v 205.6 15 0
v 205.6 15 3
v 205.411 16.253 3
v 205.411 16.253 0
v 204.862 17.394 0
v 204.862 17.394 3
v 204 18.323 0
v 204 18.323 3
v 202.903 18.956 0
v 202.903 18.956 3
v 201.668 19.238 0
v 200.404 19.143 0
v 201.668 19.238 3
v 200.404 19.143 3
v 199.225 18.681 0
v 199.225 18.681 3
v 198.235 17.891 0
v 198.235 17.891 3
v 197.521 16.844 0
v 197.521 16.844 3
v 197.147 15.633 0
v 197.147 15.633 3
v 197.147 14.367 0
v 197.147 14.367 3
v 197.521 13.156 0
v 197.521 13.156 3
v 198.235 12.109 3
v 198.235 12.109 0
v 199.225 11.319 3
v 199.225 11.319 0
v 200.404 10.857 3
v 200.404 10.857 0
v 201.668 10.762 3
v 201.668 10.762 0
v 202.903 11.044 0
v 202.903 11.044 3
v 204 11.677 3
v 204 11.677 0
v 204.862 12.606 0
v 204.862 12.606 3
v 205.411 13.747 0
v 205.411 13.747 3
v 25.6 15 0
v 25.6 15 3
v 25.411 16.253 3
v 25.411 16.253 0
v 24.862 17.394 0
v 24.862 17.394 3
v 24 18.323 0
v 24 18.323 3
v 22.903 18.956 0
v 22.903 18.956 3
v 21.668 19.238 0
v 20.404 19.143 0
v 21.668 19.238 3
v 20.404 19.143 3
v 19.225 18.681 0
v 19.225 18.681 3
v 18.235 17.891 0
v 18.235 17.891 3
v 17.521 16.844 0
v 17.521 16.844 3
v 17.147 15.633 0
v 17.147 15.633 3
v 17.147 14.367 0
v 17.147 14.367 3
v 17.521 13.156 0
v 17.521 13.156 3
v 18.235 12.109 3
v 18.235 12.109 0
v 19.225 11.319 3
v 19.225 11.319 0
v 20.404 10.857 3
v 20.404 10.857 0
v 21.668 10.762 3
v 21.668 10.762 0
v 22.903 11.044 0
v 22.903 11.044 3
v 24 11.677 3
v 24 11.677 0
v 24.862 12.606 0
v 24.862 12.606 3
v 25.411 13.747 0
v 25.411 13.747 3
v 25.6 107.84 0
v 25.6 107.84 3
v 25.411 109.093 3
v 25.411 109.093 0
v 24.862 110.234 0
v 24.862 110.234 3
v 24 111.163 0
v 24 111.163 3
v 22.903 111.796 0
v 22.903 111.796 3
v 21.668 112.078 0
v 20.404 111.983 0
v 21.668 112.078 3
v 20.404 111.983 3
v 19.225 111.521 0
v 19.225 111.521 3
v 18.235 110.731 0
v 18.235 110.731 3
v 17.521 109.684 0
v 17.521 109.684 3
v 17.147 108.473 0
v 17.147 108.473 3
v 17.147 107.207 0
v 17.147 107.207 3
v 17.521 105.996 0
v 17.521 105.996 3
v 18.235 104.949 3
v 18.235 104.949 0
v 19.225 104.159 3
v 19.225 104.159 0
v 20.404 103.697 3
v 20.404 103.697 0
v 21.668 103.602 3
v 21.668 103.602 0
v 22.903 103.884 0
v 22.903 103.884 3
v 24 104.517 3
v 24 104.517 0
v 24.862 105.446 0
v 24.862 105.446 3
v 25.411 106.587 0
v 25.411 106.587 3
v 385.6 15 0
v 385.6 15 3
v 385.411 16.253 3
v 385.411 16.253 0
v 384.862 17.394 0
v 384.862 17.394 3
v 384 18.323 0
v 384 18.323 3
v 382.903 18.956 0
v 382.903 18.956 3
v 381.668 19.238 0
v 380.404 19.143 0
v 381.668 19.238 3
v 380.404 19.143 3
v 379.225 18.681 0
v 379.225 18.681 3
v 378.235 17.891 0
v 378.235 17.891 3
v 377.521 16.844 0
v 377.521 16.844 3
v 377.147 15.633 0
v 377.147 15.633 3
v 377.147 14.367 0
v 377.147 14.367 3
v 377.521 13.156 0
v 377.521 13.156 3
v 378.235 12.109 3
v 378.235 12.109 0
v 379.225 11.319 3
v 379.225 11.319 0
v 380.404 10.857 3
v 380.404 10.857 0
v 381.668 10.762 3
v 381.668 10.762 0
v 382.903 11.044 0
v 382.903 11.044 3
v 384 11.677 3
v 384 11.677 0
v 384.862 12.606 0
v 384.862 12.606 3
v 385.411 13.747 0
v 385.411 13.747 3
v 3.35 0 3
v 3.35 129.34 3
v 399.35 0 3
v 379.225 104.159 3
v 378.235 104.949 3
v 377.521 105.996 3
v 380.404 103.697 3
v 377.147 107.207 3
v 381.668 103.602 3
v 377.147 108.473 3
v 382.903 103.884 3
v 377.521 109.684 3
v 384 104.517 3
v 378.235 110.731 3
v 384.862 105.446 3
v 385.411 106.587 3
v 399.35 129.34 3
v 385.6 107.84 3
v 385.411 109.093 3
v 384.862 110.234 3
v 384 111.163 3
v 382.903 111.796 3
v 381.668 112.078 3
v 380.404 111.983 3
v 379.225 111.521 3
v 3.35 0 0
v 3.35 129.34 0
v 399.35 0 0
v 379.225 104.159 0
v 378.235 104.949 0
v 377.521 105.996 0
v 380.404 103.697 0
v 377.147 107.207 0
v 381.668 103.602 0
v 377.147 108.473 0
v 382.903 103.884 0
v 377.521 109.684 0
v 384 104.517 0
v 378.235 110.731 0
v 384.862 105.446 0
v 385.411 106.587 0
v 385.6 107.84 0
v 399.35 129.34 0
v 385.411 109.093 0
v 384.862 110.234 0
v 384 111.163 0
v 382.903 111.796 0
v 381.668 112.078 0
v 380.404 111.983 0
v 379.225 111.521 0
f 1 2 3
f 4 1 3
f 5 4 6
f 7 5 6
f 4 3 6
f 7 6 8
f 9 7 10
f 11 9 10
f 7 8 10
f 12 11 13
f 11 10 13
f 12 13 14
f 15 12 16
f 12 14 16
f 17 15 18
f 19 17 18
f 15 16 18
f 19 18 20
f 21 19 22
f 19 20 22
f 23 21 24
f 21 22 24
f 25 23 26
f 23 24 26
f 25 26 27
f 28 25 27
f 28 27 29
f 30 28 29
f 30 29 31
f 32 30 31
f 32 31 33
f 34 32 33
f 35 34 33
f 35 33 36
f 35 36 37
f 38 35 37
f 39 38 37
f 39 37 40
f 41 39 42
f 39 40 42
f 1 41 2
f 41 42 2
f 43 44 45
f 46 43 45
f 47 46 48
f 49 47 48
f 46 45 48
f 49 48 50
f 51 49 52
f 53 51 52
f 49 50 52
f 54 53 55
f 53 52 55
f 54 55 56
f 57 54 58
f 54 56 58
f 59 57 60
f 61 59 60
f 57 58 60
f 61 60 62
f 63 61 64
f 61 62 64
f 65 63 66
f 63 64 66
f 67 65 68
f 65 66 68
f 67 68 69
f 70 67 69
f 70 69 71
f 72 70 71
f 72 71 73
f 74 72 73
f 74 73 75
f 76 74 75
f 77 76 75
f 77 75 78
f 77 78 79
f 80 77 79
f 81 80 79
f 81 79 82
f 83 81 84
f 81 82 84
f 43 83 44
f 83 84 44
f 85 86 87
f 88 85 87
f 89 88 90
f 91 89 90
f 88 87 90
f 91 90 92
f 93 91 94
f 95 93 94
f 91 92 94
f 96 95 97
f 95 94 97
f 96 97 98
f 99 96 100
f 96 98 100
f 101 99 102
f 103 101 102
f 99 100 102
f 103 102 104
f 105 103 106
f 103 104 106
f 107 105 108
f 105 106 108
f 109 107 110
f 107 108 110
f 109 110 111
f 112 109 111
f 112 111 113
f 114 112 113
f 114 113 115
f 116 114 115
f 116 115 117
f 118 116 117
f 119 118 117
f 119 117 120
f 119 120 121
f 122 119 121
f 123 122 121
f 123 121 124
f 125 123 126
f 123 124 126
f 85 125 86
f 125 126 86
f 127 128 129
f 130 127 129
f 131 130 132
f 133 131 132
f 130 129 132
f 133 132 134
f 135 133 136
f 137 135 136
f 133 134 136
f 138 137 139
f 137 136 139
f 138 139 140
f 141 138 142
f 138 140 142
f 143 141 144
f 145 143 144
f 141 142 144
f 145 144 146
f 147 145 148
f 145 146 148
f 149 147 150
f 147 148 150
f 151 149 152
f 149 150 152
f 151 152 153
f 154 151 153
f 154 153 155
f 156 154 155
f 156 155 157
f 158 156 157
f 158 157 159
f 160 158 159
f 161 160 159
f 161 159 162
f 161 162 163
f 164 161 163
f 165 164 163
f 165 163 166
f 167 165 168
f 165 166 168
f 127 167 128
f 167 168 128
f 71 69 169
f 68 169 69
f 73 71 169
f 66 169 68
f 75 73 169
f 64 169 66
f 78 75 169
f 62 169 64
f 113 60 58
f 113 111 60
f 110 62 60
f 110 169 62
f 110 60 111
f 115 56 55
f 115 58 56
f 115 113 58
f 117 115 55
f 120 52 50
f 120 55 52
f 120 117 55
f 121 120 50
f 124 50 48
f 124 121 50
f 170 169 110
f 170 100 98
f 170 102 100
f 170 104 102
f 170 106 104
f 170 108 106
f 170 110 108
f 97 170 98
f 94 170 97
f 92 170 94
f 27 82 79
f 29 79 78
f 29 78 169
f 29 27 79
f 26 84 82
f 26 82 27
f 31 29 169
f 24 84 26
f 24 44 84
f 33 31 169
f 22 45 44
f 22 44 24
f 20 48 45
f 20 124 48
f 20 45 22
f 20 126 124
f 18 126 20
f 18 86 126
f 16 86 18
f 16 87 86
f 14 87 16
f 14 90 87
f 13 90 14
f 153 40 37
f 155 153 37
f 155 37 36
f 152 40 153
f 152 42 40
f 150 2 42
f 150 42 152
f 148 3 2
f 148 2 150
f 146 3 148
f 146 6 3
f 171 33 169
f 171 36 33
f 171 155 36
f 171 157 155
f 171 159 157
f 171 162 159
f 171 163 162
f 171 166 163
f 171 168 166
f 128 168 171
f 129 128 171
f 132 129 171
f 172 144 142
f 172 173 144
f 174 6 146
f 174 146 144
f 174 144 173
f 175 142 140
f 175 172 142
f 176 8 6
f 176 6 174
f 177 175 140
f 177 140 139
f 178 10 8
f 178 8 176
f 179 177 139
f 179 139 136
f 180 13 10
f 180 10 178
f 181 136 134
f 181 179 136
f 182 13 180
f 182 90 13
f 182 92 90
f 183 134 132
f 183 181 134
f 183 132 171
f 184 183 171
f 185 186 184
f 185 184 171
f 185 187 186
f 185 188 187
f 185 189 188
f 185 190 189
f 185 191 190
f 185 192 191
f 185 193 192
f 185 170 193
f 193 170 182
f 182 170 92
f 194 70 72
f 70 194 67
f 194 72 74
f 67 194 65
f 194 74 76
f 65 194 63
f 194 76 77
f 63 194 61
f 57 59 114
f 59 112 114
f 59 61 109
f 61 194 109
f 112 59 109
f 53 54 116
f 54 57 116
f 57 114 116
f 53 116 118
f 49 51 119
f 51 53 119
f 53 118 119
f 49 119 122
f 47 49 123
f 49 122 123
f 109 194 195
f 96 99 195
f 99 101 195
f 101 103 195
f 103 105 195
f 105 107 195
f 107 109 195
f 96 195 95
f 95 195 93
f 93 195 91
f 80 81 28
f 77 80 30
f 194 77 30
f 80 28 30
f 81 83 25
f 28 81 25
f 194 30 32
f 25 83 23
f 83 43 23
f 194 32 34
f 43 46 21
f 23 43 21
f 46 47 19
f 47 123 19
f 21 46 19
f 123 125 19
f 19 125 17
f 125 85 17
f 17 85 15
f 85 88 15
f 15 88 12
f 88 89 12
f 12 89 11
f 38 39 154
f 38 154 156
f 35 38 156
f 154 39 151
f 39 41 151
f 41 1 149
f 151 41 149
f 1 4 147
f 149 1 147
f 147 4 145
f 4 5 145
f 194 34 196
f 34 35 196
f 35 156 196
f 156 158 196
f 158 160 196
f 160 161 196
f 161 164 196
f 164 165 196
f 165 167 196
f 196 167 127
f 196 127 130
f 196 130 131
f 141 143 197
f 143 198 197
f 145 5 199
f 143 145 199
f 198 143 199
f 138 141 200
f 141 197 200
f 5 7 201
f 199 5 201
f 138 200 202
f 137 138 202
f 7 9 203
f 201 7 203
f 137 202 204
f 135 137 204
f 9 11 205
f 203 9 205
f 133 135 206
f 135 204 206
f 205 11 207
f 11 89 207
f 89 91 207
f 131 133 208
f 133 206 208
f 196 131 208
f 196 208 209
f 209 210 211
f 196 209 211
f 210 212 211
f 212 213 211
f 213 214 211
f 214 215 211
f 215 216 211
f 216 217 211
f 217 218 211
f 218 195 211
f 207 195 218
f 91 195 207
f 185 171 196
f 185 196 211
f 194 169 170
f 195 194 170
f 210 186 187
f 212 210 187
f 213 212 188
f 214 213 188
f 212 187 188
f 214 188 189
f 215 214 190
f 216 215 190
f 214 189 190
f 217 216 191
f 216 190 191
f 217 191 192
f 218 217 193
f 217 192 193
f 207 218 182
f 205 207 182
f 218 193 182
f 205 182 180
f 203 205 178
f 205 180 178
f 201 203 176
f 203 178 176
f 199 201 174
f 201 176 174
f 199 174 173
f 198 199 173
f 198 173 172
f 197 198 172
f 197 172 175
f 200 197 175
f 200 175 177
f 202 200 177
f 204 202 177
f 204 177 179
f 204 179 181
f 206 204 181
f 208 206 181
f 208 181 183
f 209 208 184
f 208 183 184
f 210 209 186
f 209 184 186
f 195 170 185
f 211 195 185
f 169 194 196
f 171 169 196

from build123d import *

# Parameters (mm, degrees)
SKETCH1_R               = 4
BOSS_EXTRUDE1_DEPTH     = 3
CROQUIS1_W              = 29
CROQUIS1_H              = 43
SALIENTE_EXTRUIR1_DEPTH = 3
CROQUIS2_R              = 4.25
CORTAR_EXTRUIR1_DEPTH   = 3
CROQUIS4_W              = 3.35
CROQUIS4_H              = 129.34
CORTAR_EXTRUIR2_DEPTH   = 3
CROQUIS5_R              = 4.5
SALIENTE_EXTRUIR2_DEPTH = 3
CROQUIS6_R              = 4.25
CORTAR_EXTRUIR3_DEPTH   = 3


with BuildPart() as part:
    # Sketch1 → Boss-Extrude1 (new body)
    with BuildSketch(Plane.XY):
        Polygon((0, 0), (402.7, 0), (402.7, 86.34), (373.7, 86.34), (373.7, 129.34), (29, 129.34), (29, 86.34), (0, 86.34), align=None)
        with Locations((21.35, 71.34)):
            Circle(SKETCH1_R, mode=Mode.SUBTRACT)
        with Locations((21.35, 15)):
            Circle(SKETCH1_R, mode=Mode.SUBTRACT)
        with Locations((381.35, 15)):
            Circle(SKETCH1_R, mode=Mode.SUBTRACT)
        with Locations((381.35, 71.34)):
            Circle(SKETCH1_R, mode=Mode.SUBTRACT)
        with Locations((199, 15)):
            Circle(SKETCH1_R, mode=Mode.SUBTRACT)
    extrude(amount=BOSS_EXTRUDE1_DEPTH)

    # Croquis1 → Saliente-Extruir1 (add)
    with BuildSketch(Plane.XY.offset(3)):
        with Locations((14.5, 107.84)):
            Rectangle(CROQUIS1_W, CROQUIS1_H)
        with Locations((388.2, 107.84)):
            Rectangle(CROQUIS1_W, CROQUIS1_H)
    extrude(amount=-SALIENTE_EXTRUIR1_DEPTH)

    # Croquis2 → Cortar-Extruir1 (cut)
    with BuildSketch(Plane.XY.offset(3)):
        with Locations((15, 107.84)):
            Circle(CROQUIS2_R)
        with Locations((387.7, 107.84)):
            Circle(CROQUIS2_R)
    extrude(amount=-CORTAR_EXTRUIR1_DEPTH, mode=Mode.SUBTRACT)

    # Croquis4 → Cortar-Extruir2 (cut)
    with BuildSketch(Plane.XY.offset(3)):
        with Locations((1.675, 64.67)):
            Rectangle(CROQUIS4_W, CROQUIS4_H)
        with Locations((401.025, 64.67)):
            Rectangle(CROQUIS4_W, CROQUIS4_H)
    extrude(amount=-CORTAR_EXTRUIR2_DEPTH, mode=Mode.SUBTRACT)

    # Croquis5 → Saliente-Extruir2 (add)
    with BuildSketch(Plane.XY.offset(3)):
        with Locations((199, 15)):
            Circle(CROQUIS5_R)
        with Locations((21.35, 15)):
            Circle(CROQUIS5_R)
        with Locations((21.35, 71.34)):
            Circle(CROQUIS5_R)
        with Locations((15, 107.84)):
            Circle(CROQUIS5_R)
        with Locations((387.7, 107.84)):
            Circle(CROQUIS5_R)
        with Locations((381.35, 71.34)):
            Circle(CROQUIS5_R)
        with Locations((381.35, 15)):
            Circle(CROQUIS5_R)
    extrude(amount=-SALIENTE_EXTRUIR2_DEPTH)

    # Croquis6 → Cortar-Extruir3 (cut)
    with BuildSketch(Plane.XY.offset(3)):
        with Locations((21.35, 107.84)):
            Circle(CROQUIS6_R)
        with Locations((21.35, 15)):
            Circle(CROQUIS6_R)
        with Locations((201.35, 15)):
            Circle(CROQUIS6_R)
        with Locations((381.35, 15)):
            Circle(CROQUIS6_R)
        with Locations((381.35, 107.84)):
            Circle(CROQUIS6_R)
    extrude(amount=-CORTAR_EXTRUIR3_DEPTH, mode=Mode.SUBTRACT)


solid = part.part
